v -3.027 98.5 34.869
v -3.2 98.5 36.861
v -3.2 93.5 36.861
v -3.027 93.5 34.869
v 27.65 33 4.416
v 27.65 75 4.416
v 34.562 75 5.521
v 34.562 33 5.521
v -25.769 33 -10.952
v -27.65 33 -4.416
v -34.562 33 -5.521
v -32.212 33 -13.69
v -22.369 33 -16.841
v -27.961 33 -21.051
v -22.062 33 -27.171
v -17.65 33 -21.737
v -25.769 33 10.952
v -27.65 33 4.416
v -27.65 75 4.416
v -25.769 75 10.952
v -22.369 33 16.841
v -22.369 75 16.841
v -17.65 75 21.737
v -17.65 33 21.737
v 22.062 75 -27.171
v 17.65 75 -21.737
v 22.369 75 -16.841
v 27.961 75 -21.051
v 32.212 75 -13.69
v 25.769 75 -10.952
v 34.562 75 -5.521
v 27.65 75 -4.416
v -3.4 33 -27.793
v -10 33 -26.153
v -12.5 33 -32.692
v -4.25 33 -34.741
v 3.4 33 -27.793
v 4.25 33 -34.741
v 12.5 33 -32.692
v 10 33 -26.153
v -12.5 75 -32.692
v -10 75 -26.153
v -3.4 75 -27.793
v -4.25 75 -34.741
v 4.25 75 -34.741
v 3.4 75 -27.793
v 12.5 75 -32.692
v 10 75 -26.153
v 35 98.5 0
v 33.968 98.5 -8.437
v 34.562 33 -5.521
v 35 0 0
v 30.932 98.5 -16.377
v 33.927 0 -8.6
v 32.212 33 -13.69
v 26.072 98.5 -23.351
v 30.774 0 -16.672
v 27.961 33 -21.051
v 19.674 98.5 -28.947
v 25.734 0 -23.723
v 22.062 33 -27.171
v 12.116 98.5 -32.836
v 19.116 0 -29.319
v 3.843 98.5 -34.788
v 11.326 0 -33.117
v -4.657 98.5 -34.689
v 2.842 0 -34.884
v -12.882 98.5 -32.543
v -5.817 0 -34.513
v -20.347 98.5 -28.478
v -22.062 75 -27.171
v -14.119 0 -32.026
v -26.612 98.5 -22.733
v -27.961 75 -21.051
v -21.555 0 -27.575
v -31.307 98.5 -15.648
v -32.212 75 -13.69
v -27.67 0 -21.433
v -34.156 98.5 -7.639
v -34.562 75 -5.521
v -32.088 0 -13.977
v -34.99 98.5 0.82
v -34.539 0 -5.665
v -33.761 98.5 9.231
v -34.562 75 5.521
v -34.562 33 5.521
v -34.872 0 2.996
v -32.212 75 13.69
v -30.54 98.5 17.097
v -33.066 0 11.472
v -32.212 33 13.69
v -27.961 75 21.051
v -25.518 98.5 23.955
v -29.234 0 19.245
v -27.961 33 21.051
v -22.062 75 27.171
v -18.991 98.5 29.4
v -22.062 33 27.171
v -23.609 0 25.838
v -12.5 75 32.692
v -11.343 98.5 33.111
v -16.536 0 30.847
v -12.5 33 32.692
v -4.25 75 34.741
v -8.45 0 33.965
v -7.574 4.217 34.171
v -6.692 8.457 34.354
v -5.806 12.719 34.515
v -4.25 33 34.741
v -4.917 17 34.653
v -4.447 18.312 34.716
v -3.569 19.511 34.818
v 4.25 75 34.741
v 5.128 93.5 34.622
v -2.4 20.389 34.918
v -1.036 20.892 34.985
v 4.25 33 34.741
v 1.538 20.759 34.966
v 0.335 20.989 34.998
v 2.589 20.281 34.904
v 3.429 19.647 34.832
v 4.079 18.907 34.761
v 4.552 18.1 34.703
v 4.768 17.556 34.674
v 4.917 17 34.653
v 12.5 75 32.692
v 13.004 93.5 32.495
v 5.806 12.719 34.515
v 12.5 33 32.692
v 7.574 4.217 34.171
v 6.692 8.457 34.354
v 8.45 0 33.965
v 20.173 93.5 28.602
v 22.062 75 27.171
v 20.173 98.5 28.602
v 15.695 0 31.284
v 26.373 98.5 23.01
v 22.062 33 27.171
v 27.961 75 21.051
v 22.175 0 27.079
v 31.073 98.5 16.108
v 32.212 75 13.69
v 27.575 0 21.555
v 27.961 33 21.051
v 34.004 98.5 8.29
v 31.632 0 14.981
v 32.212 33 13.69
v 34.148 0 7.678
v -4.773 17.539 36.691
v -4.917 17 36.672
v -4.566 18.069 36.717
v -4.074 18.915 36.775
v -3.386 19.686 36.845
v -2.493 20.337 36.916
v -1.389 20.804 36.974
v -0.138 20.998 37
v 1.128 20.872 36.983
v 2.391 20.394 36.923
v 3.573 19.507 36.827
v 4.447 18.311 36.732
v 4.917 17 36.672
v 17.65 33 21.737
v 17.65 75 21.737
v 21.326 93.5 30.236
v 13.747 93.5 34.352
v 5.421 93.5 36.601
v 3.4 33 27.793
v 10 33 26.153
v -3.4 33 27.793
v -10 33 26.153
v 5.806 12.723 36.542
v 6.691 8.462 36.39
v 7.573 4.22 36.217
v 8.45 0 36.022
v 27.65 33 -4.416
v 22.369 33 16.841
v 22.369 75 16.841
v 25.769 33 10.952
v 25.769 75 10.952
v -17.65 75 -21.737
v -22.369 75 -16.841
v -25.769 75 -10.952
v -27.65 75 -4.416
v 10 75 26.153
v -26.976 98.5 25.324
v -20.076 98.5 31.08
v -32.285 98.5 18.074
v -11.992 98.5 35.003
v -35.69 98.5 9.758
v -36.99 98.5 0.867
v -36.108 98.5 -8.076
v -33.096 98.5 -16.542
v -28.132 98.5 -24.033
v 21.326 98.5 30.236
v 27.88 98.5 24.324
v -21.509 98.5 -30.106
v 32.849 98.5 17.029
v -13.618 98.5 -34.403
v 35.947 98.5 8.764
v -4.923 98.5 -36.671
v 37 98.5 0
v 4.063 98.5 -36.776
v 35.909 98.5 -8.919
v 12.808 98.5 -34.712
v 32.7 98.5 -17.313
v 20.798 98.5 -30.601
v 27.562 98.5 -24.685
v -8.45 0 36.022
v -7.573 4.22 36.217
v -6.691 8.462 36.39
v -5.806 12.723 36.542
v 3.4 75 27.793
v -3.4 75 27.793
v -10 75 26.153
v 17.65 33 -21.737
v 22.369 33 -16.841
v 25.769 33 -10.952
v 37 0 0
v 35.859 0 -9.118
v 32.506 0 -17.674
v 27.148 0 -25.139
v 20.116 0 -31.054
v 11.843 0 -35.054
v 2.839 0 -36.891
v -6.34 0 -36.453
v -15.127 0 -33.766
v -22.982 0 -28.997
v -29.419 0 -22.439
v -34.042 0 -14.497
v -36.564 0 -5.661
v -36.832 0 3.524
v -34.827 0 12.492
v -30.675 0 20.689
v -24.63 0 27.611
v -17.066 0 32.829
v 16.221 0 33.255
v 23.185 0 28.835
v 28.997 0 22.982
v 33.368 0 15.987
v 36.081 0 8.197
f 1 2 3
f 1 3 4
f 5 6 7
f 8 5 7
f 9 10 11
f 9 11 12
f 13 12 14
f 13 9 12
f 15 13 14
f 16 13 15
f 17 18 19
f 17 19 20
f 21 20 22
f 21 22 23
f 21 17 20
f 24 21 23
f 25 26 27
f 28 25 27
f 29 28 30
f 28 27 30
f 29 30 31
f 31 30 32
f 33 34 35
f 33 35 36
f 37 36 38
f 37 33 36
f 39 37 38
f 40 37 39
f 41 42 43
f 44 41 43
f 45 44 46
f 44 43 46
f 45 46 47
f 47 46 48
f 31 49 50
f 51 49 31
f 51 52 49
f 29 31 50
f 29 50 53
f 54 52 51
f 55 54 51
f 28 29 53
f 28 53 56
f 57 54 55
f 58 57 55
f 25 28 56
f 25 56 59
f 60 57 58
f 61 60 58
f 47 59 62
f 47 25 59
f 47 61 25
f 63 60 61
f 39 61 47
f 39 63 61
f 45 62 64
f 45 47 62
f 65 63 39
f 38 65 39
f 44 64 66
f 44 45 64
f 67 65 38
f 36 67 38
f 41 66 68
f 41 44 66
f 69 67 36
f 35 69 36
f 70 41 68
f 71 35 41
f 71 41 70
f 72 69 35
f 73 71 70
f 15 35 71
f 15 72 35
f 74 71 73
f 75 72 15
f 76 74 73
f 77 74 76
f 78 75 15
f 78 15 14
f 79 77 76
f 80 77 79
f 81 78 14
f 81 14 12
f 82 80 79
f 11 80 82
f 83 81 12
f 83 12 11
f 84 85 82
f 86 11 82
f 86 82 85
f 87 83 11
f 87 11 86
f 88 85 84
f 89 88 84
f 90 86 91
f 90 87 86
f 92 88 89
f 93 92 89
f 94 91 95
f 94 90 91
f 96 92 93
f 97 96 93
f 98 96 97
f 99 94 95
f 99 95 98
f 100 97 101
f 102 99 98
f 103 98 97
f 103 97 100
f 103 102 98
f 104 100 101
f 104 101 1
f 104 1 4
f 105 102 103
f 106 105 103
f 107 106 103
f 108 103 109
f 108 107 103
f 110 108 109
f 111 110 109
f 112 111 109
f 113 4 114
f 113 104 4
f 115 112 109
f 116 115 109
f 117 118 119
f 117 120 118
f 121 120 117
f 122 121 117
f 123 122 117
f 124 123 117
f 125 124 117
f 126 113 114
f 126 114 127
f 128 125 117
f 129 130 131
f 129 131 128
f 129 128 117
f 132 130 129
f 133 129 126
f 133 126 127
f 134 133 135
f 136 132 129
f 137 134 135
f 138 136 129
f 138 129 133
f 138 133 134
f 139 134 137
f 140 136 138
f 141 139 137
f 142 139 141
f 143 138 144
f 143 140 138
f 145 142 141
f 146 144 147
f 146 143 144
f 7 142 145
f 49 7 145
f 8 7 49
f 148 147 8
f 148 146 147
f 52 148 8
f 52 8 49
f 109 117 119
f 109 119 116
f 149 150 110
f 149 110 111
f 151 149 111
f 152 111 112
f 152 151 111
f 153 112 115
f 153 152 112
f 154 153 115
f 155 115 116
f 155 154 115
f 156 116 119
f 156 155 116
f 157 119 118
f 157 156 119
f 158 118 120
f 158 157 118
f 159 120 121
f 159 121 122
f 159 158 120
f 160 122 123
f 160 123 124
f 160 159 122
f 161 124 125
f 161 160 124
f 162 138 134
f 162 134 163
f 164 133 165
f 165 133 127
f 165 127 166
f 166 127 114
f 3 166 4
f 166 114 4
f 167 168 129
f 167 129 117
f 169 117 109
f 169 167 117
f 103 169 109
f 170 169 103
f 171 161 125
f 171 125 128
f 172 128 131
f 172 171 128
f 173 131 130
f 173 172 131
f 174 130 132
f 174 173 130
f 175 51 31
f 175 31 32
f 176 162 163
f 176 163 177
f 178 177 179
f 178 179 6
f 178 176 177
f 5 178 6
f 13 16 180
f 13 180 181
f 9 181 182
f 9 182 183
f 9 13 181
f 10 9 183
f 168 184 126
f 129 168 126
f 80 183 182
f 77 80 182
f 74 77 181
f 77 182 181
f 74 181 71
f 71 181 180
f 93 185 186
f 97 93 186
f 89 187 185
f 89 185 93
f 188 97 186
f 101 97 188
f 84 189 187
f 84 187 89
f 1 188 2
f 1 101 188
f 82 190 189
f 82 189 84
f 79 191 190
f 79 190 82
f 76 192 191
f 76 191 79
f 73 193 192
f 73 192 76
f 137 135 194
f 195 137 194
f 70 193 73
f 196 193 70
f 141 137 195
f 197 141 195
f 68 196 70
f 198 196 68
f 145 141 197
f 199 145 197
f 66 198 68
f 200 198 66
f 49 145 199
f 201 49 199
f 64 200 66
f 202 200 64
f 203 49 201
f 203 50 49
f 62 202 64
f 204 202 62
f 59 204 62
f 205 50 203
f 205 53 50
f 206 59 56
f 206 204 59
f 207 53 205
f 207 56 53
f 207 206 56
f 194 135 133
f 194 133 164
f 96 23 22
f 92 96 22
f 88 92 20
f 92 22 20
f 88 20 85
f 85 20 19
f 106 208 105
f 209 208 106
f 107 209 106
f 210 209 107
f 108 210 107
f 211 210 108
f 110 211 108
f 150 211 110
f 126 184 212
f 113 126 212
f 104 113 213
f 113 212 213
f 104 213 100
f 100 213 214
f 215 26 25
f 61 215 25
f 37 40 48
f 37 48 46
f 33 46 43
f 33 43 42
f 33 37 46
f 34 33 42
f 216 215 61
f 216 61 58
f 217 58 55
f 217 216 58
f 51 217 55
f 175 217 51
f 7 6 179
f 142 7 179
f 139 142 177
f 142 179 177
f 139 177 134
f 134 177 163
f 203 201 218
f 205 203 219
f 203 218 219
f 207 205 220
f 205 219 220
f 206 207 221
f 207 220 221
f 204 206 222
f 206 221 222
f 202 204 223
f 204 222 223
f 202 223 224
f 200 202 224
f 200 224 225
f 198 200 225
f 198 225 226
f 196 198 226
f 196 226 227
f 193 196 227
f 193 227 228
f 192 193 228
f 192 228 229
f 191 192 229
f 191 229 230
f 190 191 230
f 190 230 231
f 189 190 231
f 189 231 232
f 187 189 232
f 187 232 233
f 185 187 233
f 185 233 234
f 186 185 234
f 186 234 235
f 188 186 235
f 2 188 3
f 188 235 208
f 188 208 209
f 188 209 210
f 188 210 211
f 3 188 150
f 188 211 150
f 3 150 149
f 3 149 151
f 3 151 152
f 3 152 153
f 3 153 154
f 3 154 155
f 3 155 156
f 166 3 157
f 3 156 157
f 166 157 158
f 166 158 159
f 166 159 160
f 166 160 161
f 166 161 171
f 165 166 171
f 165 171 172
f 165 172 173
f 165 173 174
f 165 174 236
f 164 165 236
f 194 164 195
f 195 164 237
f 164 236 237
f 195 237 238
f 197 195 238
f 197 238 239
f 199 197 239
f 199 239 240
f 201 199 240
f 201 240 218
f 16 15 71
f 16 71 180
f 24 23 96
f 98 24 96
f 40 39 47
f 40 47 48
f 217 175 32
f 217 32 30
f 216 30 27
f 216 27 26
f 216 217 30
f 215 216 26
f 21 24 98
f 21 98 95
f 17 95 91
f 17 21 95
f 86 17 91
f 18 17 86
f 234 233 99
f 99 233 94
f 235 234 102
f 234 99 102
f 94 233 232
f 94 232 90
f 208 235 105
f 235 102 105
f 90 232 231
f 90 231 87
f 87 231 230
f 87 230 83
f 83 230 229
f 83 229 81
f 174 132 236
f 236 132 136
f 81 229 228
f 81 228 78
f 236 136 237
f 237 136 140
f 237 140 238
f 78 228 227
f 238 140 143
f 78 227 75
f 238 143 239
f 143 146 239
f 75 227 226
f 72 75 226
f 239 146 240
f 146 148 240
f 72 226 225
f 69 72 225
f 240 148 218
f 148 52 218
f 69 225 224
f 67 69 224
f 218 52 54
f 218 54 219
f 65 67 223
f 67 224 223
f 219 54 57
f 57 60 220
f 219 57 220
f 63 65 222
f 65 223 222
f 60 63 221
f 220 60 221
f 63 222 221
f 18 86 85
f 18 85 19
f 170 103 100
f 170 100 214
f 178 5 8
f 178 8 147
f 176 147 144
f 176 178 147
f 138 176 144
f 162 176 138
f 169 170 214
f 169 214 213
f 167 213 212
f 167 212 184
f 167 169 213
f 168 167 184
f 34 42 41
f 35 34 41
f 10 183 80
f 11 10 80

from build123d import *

# Parameters (mm, degrees)
SKETCH1_R           = 37
SKETCH1_R_2         = 35
BOSS_EXTRUDE1_DEPTH = 98.5
CUT_EXTRUDE2_REACH  = 76
CUT_EXTRUDE3_DEPTH  = 5
BOSS_EXTRUDE2_DEPTH = 42
CIRPATTERN1_COUNT   = 6


with BuildPart() as part:
    # Sketch1 → Boss-Extrude1 (new body)
    with BuildSketch(Plane(origin=(0, 0, 0), x_dir=(1, 0, 0), z_dir=(0, 1, 0))):
        Circle(SKETCH1_R)
        Circle(SKETCH1_R_2, mode=Mode.SUBTRACT)
    extrude(amount=BOSS_EXTRUDE1_DEPTH)

    # Sketch2 → Cut-Extrude2 (cut, up to next)
    with BuildSketch(Plane.XY.offset(37), mode=Mode.PRIVATE) as cut_extrude2_sk1:
        with BuildLine():
            Line((-8.45, 0), (-4.916814722, 17))
            ThreePointArc((-4.916814722, 17), (0, 21), (4.916814722, 17))
            Line((4.916814722, 17), (8.45, 0))
            Line((8.45, 0), (-8.45, 0))
        make_face()
    cut_extrude2_tool1 = extrude(cut_extrude2_sk1.sketch, amount=-CUT_EXTRUDE2_REACH, mode=Mode.PRIVATE) & part.part
    add(cut_extrude2_tool1.solids().sort_by_distance((0, 9.002939, 37))[0], mode=Mode.SUBTRACT)

    # Sketch4 → Cut-Extrude3 (cut)
    with BuildSketch(Plane(origin=(0, 98.5, 0), x_dir=(1, 0, 0), z_dir=(0, 1, 0))):
        with BuildLine():
            Line((20.172972973, -28.601593687), (21.325714286, -30.235970469))
            ThreePointArc((21.325714286, -30.235970469), (9.649317719, -35.719611806), (-3.2, -36.861361885))
            Line((-3.2, -36.861361885), (-3.027027027, -34.868855837))
            ThreePointArc((-3.027027027, -34.868855837), (9.127732978, -33.788821978), (20.172972973, -28.601593687))
        make_face()
    extrude(amount=-CUT_EXTRUDE3_DEPTH, mode=Mode.SUBTRACT)

    # Sketch5 → Boss-Extrude2 (add)
    with BuildSketch(Plane(origin=(0, 33, 0), x_dir=(1, 0, 0), z_dir=(0, 1, 0))):
        with BuildLine():
            Line((-12.5, -32.691742077), (-10, -26.153393661))
            ThreePointArc((-10, -26.153393661), (0, -28), (10, -26.153393661))
            Line((10, -26.153393661), (12.5, -32.691742077))
            ThreePointArc((12.5, -32.691742077), (0, -35), (-12.5, -32.691742077))
        make_face()
    boss_extrude2 = extrude(amount=BOSS_EXTRUDE2_DEPTH)

    # CirPattern1: Boss-Extrude2 ×6 about axis
    cirpattern1_axis = Axis((0, 0, 0), (0, 1, 0))
    for i in range(1, CIRPATTERN1_COUNT):
        add(boss_extrude2.rotate(cirpattern1_axis, i * 360 / CIRPATTERN1_COUNT))


solid = part.part
